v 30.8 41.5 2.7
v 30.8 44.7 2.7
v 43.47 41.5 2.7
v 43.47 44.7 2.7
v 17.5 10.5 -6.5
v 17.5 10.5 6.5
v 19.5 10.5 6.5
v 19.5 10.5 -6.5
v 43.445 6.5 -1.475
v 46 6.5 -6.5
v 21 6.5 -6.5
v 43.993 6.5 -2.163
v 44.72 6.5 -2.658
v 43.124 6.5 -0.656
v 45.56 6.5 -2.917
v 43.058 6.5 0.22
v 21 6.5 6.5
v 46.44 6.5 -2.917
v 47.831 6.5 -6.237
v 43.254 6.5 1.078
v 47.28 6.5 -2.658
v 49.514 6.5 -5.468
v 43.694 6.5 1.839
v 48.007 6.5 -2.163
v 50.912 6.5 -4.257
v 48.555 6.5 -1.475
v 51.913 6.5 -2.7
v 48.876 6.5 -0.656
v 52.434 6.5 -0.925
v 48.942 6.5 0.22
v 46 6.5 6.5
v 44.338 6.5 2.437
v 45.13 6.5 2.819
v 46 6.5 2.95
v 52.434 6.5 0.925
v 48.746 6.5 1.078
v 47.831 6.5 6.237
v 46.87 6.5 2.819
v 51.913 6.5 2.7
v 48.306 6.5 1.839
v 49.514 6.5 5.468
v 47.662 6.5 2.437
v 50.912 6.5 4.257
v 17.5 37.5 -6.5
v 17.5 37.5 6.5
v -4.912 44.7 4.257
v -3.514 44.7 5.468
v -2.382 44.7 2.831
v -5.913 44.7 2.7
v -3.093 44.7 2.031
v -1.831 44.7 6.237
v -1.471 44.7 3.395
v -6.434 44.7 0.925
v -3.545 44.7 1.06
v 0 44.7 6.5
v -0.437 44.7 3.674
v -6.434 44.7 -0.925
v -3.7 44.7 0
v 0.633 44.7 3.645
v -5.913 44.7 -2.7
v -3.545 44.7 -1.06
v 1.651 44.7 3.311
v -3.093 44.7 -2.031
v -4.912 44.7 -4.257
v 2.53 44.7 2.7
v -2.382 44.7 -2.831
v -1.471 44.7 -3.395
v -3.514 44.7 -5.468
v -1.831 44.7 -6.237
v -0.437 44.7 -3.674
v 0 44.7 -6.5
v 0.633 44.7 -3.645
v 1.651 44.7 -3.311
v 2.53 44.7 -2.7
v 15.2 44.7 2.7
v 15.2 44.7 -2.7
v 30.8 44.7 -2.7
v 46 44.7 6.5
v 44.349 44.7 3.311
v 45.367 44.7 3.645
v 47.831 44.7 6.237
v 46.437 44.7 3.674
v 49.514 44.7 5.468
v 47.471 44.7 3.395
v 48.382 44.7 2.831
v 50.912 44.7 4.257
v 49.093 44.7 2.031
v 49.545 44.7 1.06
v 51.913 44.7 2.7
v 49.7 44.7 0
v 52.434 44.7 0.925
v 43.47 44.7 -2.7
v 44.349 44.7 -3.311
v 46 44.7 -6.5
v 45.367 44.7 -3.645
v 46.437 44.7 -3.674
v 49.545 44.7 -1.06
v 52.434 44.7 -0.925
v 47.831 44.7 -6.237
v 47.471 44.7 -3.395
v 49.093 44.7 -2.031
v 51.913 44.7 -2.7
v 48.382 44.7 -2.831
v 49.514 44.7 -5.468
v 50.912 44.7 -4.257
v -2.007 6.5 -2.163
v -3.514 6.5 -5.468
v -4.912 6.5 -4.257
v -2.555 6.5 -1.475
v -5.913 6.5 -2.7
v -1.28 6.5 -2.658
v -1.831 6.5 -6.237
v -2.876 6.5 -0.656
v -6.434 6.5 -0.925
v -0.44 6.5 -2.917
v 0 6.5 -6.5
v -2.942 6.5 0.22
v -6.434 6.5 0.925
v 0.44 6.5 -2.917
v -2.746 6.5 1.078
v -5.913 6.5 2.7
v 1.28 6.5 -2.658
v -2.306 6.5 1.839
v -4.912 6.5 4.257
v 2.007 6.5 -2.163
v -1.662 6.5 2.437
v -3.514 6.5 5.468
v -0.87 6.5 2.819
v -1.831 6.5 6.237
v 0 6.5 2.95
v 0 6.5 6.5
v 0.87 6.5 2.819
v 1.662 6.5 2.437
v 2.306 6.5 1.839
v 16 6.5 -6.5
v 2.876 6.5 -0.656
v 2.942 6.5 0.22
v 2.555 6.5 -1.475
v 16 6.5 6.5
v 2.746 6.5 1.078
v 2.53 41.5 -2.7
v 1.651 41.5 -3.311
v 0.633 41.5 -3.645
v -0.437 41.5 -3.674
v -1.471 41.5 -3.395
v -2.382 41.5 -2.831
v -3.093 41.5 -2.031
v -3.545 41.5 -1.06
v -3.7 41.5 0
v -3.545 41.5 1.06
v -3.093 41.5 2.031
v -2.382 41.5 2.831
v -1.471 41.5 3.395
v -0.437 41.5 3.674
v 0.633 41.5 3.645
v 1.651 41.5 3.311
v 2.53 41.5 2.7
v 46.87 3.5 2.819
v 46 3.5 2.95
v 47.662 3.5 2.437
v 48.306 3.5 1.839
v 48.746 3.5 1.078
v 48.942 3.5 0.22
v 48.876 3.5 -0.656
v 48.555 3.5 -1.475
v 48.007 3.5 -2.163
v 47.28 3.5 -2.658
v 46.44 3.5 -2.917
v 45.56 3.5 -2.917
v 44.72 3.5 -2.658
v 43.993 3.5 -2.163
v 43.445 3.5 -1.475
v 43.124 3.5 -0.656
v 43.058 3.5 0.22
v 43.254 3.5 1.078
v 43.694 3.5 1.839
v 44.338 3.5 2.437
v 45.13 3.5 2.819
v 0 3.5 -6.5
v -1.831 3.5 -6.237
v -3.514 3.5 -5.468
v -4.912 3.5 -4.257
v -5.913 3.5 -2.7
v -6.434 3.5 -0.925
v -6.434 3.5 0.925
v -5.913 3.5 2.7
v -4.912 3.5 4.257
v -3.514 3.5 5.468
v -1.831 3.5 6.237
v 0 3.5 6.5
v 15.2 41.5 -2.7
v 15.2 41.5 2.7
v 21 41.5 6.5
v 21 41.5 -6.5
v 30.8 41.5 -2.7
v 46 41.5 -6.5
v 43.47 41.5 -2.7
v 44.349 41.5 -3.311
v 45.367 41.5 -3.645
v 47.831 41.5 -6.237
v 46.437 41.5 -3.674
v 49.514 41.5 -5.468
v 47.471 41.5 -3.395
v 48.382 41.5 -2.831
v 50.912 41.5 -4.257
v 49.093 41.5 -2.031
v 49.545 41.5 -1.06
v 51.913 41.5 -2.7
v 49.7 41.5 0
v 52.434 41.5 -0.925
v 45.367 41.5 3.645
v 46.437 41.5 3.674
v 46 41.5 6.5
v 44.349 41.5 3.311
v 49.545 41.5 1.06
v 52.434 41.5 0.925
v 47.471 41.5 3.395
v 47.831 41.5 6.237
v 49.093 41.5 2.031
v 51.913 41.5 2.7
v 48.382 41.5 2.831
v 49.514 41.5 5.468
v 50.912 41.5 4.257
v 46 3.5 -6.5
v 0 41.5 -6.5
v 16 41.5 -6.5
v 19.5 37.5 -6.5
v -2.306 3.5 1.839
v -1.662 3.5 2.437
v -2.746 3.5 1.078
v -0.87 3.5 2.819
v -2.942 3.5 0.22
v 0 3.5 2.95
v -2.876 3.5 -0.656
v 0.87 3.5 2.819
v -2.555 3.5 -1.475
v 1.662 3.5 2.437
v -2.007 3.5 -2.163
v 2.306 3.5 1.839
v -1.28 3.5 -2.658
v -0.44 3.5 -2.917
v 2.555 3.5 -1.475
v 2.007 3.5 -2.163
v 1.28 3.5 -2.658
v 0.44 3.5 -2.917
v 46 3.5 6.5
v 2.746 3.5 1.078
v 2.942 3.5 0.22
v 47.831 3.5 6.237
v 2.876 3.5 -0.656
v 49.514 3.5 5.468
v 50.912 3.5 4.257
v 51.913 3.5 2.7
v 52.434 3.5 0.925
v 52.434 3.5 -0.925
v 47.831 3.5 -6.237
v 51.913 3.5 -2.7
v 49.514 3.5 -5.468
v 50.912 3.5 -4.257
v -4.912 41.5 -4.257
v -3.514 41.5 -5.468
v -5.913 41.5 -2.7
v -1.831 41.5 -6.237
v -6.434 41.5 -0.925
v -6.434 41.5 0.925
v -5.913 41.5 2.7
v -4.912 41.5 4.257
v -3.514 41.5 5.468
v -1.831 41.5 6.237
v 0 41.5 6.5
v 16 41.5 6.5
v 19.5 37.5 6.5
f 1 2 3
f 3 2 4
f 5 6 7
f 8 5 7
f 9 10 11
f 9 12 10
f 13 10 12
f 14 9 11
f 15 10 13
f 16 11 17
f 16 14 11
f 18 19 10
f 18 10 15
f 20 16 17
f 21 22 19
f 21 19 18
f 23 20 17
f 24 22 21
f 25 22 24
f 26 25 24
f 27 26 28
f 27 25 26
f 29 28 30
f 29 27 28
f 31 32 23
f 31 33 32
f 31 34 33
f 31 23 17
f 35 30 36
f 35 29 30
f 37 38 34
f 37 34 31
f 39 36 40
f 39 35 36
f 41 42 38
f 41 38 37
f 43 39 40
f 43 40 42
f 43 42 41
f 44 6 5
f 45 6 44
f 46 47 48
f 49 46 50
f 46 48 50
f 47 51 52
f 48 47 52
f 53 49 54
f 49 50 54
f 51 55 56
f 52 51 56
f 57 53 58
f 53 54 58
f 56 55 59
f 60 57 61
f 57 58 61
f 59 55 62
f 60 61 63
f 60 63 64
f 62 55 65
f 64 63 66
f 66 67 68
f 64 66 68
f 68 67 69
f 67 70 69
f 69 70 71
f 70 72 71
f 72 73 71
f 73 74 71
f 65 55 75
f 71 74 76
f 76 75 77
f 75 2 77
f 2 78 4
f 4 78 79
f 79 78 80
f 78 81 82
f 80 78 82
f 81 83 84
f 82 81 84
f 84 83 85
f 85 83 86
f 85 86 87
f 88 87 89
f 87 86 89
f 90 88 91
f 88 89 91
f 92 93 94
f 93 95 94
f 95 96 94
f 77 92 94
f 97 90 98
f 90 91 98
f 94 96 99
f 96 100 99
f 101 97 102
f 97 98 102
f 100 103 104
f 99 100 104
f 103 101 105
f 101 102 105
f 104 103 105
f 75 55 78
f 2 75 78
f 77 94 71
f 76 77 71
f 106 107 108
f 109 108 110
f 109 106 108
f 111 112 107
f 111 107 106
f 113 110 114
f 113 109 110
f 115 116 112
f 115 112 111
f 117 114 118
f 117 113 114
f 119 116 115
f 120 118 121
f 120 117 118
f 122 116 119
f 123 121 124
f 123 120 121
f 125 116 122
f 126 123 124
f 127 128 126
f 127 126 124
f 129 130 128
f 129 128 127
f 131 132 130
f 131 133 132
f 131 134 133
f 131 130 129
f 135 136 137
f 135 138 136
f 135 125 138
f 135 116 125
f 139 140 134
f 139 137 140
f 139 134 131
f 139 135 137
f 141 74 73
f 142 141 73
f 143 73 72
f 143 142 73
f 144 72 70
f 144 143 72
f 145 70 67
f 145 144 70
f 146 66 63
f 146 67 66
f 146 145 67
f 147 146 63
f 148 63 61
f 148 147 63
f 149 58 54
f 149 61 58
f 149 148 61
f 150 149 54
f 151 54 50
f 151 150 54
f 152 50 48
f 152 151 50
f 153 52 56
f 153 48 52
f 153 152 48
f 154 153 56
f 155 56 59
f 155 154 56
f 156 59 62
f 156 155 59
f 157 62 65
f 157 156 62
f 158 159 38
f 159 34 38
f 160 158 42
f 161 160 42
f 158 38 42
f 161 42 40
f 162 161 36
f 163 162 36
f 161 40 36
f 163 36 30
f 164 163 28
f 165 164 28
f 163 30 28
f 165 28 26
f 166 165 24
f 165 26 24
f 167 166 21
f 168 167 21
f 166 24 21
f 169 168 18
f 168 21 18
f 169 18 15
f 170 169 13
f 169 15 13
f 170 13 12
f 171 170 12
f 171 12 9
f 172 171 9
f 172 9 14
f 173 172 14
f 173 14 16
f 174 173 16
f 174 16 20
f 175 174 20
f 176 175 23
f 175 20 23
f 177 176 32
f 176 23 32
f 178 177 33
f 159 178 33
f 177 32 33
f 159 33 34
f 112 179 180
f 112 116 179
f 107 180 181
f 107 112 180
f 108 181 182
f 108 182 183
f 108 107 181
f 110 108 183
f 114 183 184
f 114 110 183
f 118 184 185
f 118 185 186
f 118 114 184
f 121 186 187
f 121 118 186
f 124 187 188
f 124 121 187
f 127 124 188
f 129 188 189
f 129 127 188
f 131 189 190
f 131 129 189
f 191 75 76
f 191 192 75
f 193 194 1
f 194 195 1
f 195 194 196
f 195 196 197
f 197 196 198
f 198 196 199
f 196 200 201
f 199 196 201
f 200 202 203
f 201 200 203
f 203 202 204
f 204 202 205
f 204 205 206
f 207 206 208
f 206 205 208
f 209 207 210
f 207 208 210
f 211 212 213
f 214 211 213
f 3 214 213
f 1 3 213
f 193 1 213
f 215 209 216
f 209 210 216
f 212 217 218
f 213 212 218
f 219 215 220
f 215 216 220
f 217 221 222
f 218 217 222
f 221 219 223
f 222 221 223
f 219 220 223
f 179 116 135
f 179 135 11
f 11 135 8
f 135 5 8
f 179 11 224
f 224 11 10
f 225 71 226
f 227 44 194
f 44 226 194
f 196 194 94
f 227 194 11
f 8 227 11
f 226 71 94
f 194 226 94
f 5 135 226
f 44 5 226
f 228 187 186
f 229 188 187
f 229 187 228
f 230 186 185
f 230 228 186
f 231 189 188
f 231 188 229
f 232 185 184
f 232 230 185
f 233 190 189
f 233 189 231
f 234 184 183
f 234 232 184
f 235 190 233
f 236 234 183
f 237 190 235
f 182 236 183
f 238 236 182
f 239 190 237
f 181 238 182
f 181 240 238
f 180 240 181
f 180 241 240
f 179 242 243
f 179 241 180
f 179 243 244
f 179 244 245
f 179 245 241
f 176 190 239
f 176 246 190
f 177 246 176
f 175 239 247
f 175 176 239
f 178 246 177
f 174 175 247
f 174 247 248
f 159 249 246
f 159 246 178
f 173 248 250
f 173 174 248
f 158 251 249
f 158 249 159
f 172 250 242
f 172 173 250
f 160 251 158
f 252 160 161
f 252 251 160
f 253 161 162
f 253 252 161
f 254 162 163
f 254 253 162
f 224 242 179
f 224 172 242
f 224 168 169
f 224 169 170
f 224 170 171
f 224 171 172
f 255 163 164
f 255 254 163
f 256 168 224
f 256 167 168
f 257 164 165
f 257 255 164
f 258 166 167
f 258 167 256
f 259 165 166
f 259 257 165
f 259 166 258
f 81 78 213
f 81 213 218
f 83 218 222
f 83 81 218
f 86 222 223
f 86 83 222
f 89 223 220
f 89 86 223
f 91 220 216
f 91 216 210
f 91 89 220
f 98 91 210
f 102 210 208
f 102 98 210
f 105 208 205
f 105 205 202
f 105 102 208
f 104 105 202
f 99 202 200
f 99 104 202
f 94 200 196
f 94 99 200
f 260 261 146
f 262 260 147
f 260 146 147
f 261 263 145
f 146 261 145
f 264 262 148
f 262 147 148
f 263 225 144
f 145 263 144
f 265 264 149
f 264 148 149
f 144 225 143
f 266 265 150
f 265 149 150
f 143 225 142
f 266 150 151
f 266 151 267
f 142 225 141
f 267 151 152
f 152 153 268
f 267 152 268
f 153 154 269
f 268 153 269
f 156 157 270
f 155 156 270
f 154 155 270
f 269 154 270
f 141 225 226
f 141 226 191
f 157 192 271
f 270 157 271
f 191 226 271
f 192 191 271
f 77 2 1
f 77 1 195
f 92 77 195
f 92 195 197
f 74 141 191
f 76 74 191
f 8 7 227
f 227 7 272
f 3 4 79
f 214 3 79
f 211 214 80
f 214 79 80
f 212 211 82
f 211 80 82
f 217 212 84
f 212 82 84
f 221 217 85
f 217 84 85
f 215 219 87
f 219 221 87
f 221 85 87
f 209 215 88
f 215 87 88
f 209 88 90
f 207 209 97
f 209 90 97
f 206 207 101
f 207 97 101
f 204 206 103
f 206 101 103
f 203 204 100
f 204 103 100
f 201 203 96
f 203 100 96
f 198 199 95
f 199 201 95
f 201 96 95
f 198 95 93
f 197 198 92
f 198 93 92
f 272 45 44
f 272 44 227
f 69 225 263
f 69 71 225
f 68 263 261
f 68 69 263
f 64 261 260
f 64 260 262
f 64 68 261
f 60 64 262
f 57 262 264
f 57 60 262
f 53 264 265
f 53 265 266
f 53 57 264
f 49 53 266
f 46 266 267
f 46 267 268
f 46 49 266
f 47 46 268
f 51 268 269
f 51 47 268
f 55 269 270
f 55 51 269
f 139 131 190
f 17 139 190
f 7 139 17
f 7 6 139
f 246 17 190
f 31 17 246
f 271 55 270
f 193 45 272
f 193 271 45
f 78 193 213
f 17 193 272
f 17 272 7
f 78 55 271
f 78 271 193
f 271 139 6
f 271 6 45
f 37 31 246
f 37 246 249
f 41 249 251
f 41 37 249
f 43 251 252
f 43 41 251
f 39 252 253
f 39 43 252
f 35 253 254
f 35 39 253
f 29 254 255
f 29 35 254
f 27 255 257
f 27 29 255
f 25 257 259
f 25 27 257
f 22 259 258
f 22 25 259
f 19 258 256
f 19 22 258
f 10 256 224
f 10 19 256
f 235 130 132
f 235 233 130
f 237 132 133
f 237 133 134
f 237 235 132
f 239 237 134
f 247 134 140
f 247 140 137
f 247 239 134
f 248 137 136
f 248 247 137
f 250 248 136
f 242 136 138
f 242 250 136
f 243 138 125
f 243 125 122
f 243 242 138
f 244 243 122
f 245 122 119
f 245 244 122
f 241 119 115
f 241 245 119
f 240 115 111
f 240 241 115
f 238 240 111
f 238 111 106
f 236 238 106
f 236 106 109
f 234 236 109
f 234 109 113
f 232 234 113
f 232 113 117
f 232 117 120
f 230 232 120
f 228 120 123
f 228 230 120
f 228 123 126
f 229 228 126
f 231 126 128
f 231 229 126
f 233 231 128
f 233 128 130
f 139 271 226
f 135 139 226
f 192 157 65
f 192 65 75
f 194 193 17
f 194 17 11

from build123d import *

# Parameters (mm, degrees)
BOSS_EXTRUDE1_START   = 43.1
SKETCH1_R             = 6.5
BOSS_EXTRUDE1_DEPTH   = 1.6
BOSS_EXTRUDE1_2_DEPTH = 1.6
BOSS_EXTRUDE2_START   = 43.1
SKETCH2_W             = 46
SKETCH2_H             = 13
BOSS_EXTRUDE2_DEPTH   = 1.6
CUT_EXTRUDE1_START    = 43.1
SKETCH3_R             = 3.7
CUT_EXTRUDE1_DEPTH    = 1.6
CUT_EXTRUDE2_START    = 43.1
SKETCH4_W             = 15.2
SKETCH4_H             = 5.4
CUT_EXTRUDE2_DEPTH    = 1.6
BOSS_EXTRUDE3_START   = 5
SKETCH5_R             = 6.5
BOSS_EXTRUDE3_DEPTH   = 1.5
BOSS_EXTRUDE3_2_DEPTH = 1.5
BOSS_EXTRUDE4_START   = 5
SKETCH6_W             = 46
SKETCH6_H             = 13
BOSS_EXTRUDE4_DEPTH   = 1.5
CUT_EXTRUDE3_START    = 5
SKETCH7_R             = 2.95
CUT_EXTRUDE3_DEPTH    = 1.5
BOSS_EXTRUDE5_START   = 18.5
SKETCH8_W             = 13
SKETCH8_H             = 41.2
BOSS_EXTRUDE5_DEPTH   = 2.5
CUT_EXTRUDE4_START    = -0.01
SKETCH9_W             = 2
SKETCH9_H             = 27
CUT_EXTRUDE4_DEPTH    = 6.51


with BuildPart() as part:
    # Sketch1 → Boss-Extrude1 (new, symmetric)
    with BuildSketch(Plane(origin=(0, 0, 0), x_dir=(1, 0, 0), z_dir=(0, 1, 0)).offset(BOSS_EXTRUDE1_START)):
        with Locations(Location((0, 0, 0), (0, 0, 270))):
            Circle(SKETCH1_R)
    extrude(amount=BOSS_EXTRUDE1_DEPTH, both=True)



with BuildPart() as body_2:
    # Sketch1 → Boss-Extrude1 2 (new, symmetric)
    with BuildSketch(Plane(origin=(0, 0, 0), x_dir=(1, 0, 0), z_dir=(0, 1, 0)).offset(BOSS_EXTRUDE1_START)):
        with Locations(Location((46, 0, 0), (0, 0, 270))):
            Circle(SKETCH1_R)
    extrude(amount=BOSS_EXTRUDE1_2_DEPTH, both=True)


with BuildPart() as part_1:
    add(part.part)

    add(body_2.part)  # Boss-Extrude2 merges body 2
    # Sketch2 → Boss-Extrude2 (add, symmetric)
    with BuildSketch(Plane(origin=(0, 0, 0), x_dir=(1, 0, 0), z_dir=(0, 1, 0)).offset(BOSS_EXTRUDE2_START)):
        with Locations((23, 0)):
            Rectangle(SKETCH2_W, SKETCH2_H)
    extrude(amount=BOSS_EXTRUDE2_DEPTH, both=True)

    # Sketch3 → Cut-Extrude1 (cut, symmetric)
    with BuildSketch(Plane(origin=(0, 0, 0), x_dir=(1, 0, 0), z_dir=(0, 1, 0)).offset(CUT_EXTRUDE1_START)):
        with Locations(Location((0, 0, 0), (0, 0, 270))):
            Circle(SKETCH3_R)
        with Locations(Location((46, 0, 0), (0, 0, 270))):
            Circle(SKETCH3_R)
    extrude(amount=CUT_EXTRUDE1_DEPTH, both=True, mode=Mode.SUBTRACT)

    # Sketch4 → Cut-Extrude2 (cut, symmetric)
    with BuildSketch(Plane(origin=(0, 0, 0), x_dir=(1, 0, 0), z_dir=(0, 1, 0)).offset(CUT_EXTRUDE2_START)):
        with Locations((7.6, 0)):
            Rectangle(SKETCH4_W, SKETCH4_H)
        with Locations((38.4, 0)):
            Rectangle(SKETCH4_W, SKETCH4_H)
    extrude(amount=CUT_EXTRUDE2_DEPTH, both=True, mode=Mode.SUBTRACT)



with BuildPart() as body_2_2:
    # Sketch5 → Boss-Extrude3 (new, symmetric)
    with BuildSketch(Plane(origin=(0, 0, 0), x_dir=(1, 0, 0), z_dir=(0, 1, 0)).offset(BOSS_EXTRUDE3_START)):
        with Locations(Location((0, 0, 0), (0, 0, 270))):
            Circle(SKETCH5_R)
    extrude(amount=BOSS_EXTRUDE3_DEPTH, both=True)



with BuildPart() as body_3:
    # Sketch5 → Boss-Extrude3 2 (new, symmetric)
    with BuildSketch(Plane(origin=(0, 0, 0), x_dir=(1, 0, 0), z_dir=(0, 1, 0)).offset(BOSS_EXTRUDE3_START)):
        with Locations(Location((46, 0, 0), (0, 0, 270))):
            Circle(SKETCH5_R)
    extrude(amount=BOSS_EXTRUDE3_2_DEPTH, both=True)


with BuildPart() as body_2_2_1:
    add(body_2_2.part)

    add(body_3.part)  # Boss-Extrude4 merges body 3
    # Sketch6 → Boss-Extrude4 (add, symmetric)
    with BuildSketch(Plane(origin=(0, 0, 0), x_dir=(1, 0, 0), z_dir=(0, 1, 0)).offset(BOSS_EXTRUDE4_START)):
        with Locations((23, 0)):
            Rectangle(SKETCH6_W, SKETCH6_H)
    extrude(amount=BOSS_EXTRUDE4_DEPTH, both=True)

    # Sketch7 → Cut-Extrude3 (cut, symmetric)
    with BuildSketch(Plane(origin=(0, 0, 0), x_dir=(1, 0, 0), z_dir=(0, 1, 0)).offset(CUT_EXTRUDE3_START)):
        with Locations(Location((0, 0, 0), (0, 0, 270))):
            Circle(SKETCH7_R)
        with Locations(Location((46, 0, 0), (0, 0, 270))):
            Circle(SKETCH7_R)
    extrude(amount=CUT_EXTRUDE3_DEPTH, both=True, mode=Mode.SUBTRACT)


with BuildPart() as part_2:
    add(part_1.part)

    add(body_2_2_1.part)  # Boss-Extrude5 merges body 2 2
    # Sketch8 → Boss-Extrude5 (add, symmetric)
    with BuildSketch(Plane(origin=(0, 0, 0), x_dir=(0, 0, -1), z_dir=(1, 0, 0)).offset(BOSS_EXTRUDE5_START)):
        with Locations((0, 24.1)):
            Rectangle(SKETCH8_W, SKETCH8_H)
    extrude(amount=BOSS_EXTRUDE5_DEPTH, both=True)

    # Sketch9 → Cut-Extrude4 (cut, symmetric)
    with BuildSketch(Plane.XY.offset(CUT_EXTRUDE4_START)):
        with Locations((18.5, 24)):
            Rectangle(SKETCH9_W, SKETCH9_H)
    extrude(amount=CUT_EXTRUDE4_DEPTH, both=True, mode=Mode.SUBTRACT)


solid = part_2.part
